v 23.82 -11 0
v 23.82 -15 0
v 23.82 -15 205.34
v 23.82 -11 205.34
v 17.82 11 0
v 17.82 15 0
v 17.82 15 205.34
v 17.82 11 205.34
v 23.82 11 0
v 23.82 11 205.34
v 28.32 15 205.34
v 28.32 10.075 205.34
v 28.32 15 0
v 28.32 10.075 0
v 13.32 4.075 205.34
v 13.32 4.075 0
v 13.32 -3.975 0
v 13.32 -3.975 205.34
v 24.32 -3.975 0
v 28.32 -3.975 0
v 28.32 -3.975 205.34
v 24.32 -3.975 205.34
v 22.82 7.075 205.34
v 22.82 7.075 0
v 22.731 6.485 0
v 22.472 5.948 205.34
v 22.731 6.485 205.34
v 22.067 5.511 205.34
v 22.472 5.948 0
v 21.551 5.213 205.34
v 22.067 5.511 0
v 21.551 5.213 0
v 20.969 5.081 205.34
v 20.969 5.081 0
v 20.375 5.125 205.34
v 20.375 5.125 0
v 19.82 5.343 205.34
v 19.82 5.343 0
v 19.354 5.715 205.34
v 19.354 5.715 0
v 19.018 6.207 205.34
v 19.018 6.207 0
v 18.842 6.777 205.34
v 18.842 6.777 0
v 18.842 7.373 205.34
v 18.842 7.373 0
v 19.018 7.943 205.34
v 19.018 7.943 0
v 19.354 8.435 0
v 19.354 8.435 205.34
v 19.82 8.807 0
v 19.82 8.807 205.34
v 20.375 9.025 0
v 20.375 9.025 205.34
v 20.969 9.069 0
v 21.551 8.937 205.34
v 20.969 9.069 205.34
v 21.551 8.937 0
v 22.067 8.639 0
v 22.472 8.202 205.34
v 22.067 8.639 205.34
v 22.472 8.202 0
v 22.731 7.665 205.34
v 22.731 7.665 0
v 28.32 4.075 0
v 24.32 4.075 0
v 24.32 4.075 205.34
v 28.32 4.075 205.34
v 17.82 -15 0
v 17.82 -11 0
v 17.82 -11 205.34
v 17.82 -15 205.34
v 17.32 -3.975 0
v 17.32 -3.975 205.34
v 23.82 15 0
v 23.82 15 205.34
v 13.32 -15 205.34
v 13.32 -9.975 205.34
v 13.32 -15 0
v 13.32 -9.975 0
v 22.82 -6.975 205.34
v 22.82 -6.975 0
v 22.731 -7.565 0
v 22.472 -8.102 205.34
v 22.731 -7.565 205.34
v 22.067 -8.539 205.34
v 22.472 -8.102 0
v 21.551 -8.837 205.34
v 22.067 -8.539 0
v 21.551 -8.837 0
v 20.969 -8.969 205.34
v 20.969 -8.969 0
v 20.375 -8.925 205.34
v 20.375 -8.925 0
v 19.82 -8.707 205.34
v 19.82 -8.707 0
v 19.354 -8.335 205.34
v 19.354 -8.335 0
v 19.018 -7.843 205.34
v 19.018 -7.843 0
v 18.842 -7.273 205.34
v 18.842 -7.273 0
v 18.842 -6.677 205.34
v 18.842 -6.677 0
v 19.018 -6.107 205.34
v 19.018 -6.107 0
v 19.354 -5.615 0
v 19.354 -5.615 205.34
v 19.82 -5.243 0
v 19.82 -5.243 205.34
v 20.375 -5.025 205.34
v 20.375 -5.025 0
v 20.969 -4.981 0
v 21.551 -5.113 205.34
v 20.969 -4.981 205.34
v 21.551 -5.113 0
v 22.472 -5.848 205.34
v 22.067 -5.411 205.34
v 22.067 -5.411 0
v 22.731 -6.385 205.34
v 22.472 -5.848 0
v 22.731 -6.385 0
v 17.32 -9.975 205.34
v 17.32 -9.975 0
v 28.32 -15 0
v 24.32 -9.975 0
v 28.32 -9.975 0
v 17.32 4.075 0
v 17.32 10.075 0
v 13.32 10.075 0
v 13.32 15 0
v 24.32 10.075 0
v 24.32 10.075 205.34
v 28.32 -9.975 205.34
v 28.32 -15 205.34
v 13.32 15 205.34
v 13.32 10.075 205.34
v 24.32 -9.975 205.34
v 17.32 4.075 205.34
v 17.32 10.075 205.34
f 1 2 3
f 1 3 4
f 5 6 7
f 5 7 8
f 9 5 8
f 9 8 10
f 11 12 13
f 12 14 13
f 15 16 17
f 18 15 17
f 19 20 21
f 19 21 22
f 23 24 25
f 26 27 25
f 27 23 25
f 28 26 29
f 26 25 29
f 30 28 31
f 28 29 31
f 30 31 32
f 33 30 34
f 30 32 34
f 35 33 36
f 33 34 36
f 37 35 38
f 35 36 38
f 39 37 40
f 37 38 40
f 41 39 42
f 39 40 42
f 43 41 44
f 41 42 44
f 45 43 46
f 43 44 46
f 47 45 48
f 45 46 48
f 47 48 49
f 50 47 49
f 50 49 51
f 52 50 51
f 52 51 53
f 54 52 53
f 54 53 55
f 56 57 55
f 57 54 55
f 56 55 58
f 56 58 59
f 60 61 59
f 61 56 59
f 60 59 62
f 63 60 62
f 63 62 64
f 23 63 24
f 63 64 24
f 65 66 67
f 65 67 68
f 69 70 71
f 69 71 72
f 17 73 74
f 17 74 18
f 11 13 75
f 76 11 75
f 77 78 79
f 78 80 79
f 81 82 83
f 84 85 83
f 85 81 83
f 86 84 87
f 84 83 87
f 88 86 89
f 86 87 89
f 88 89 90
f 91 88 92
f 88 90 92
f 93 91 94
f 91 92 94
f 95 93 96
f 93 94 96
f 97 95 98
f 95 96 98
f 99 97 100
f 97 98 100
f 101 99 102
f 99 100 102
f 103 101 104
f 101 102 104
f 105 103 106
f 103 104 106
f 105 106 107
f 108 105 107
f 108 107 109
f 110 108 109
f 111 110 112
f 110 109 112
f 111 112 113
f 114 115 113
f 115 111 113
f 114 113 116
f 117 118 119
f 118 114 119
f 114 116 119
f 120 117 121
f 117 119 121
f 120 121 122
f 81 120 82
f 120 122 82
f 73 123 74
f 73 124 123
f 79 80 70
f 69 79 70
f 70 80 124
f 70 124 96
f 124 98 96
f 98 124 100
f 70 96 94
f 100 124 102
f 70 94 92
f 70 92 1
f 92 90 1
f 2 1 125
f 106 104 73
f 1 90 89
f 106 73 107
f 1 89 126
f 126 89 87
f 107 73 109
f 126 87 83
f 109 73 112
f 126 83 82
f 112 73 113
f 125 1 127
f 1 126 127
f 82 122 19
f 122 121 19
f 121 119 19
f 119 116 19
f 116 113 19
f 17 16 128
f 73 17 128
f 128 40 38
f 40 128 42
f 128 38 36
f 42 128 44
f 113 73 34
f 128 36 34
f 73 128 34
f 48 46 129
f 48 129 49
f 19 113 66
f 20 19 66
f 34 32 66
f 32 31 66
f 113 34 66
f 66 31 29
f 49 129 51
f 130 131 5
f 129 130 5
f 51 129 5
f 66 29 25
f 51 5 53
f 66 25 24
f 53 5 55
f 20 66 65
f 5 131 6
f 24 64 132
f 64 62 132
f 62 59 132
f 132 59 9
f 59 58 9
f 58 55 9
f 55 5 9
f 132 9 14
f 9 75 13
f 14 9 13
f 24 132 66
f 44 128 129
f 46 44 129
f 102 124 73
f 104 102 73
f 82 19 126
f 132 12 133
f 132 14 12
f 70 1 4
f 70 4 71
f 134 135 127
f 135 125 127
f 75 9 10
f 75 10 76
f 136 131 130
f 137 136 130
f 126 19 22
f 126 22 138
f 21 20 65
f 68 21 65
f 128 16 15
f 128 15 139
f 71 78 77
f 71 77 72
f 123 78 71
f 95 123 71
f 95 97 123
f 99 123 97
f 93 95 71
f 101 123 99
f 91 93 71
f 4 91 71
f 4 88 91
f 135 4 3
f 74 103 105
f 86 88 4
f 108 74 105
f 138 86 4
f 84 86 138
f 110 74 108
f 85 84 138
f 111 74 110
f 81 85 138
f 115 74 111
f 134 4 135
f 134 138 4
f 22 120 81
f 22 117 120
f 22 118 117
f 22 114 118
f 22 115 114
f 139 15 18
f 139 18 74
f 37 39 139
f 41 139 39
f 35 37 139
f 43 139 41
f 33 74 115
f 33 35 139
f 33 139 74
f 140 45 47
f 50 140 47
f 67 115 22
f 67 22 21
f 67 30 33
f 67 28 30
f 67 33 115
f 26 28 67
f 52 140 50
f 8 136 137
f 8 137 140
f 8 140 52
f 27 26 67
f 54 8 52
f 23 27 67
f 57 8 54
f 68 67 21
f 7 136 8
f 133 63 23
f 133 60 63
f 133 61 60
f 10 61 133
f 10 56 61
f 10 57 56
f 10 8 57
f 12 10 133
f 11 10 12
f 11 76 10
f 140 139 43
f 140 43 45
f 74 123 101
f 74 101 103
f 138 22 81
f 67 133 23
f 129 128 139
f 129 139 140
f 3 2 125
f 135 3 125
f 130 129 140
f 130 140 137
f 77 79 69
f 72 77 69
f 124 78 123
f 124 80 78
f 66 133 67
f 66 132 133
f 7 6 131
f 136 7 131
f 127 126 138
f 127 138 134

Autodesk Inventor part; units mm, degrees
ref_plane "YZ Plane" through (0, 0, 0) normal (1, 0, 0) x (0, 1, 0)
ref_plane "XZ Plane" through (0, 0, 0) normal (0, 1, 0) x (-1, 0, 0)
ref_plane "Work Plane1" through (0, 0, 0) normal (0, 0, 1) x (1, 0, 0)
sketch "Sketch1" plane through (0, 0, 0) normal (0, 0, 1) x (1, 0, 0)
  circle A0 centre (-23.32, -39.075) radius 2.355 projected
  circle A1 centre (-23.32, 39.075) radius 2.355 projected
  circle A2 centre (20.82, -6.975) radius 2 projected
  circle A3 centre (20.82, 7.075) radius 2 projected
  line L0 (32.82, 48.575) -> (-32.82, 48.575) projected
  arc A4 (-32.82, 48.575) -> (-34.82, 46.575) centre (-32.82, 46.575) ccw projected
  line L1 (-34.82, 46.575) -> (-34.82, -46.575) projected
  arc A5 (-34.82, -46.575) -> (-32.82, -48.575) centre (-32.82, -46.575) ccw projected
  line L2 (-32.82, -48.575) -> (32.82, -48.575) projected
  arc A6 (32.82, -48.575) -> (34.82, -46.575) centre (32.82, -46.575) ccw projected
  line L3 (34.82, -46.575) -> (34.82, 46.575) projected
  arc A7 (34.82, 46.575) -> (32.82, 48.575) centre (32.82, 46.575) ccw projected
  line L4 (13.32, -15) -> (28.32, 15) construction
  line L5 (28.32, -15) -> (13.32, 15) construction
  line L6 (32.32, 10.075) -> (24.32, 10.075)
  line L7 (24.32, 10.075) -> (24.32, 4.075)
  line L8 (24.32, 4.075) -> (32.32, 4.075)
  line L9 (32.32, 4.075) -> (32.32, 10.075)
  line L10 (32.32, 10.075) -> (24.32, 4.075) construction
  line L11 (24.32, 10.075) -> (32.32, 4.075) construction
  line L12 (32.32, -3.975) -> (24.32, -3.975)
  line L13 (24.32, -3.975) -> (24.32, -9.975)
  line L14 (24.32, -9.975) -> (32.32, -9.975)
  line L15 (32.32, -9.975) -> (32.32, -3.975)
  line L16 (32.32, -3.975) -> (24.32, -9.975) construction
  line L17 (24.32, -3.975) -> (32.32, -9.975) construction
  line L18 (9.32, 4.075) -> (17.32, 4.075)
  line L19 (17.32, 4.075) -> (17.32, 10.075)
  line L20 (17.32, 10.075) -> (9.32, 10.075)
  line L21 (9.32, 10.075) -> (9.32, 4.075)
  line L22 (9.32, 4.075) -> (17.32, 10.075) construction
  line L23 (17.32, 4.075) -> (9.32, 10.075) construction
  line L24 (9.32, -9.975) -> (17.32, -9.975)
  line L25 (17.32, -9.975) -> (17.32, -3.975)
  line L26 (17.32, -3.975) -> (9.32, -3.975)
  line L27 (9.32, -3.975) -> (9.32, -9.975)
  line L28 (9.32, -9.975) -> (17.32, -3.975) construction
  line L29 (17.32, -9.975) -> (9.32, -3.975) construction
  line L30 (23.82, 19) -> (17.82, 19)
  line L31 (17.82, 19) -> (17.82, 11)
  line L32 (17.82, 11) -> (23.82, 11)
  line L33 (23.82, 11) -> (23.82, 19)
  line L34 (23.82, 19) -> (17.82, 11) construction
  line L35 (17.82, 19) -> (23.82, 11) construction
  line L36 (17.82, -19) -> (23.82, -19)
  line L37 (23.82, -19) -> (23.82, -11)
  line L38 (23.82, -11) -> (17.82, -11)
  line L39 (17.82, -11) -> (17.82, -19)
  line L40 (17.82, -19) -> (23.82, -11) construction
  line L41 (23.82, -19) -> (17.82, -11) construction
  line L42 (28.32, 15) -> (23.82, 15)
  line L43 (17.82, 15) -> (13.32, 15)
  line L44 (28.32, 10.075) -> (28.32, 15)
  line L45 (28.32, -15) -> (28.32, -9.975)
  line L46 (28.32, -3.975) -> (28.32, 4.075)
  line L47 (13.32, -15) -> (17.82, -15)
  line L48 (23.82, -15) -> (28.32, -15)
  line L49 (13.32, -9.975) -> (13.32, -15)
  line L50 (13.32, 15) -> (13.32, 10.075)
  line L51 (13.32, 4.075) -> (13.32, -3.975)
  point P0 (0, 0)
  point P1 (20.82, 0)
  dimension "d0" = 15
  dimension "d1" = 30
  dimension "d2" = 8
  dimension "d3" = 6
  dimension "d4" = 6
  dimension "d5" = 8
  dimension "d6" = 6
  dimension "d7" = 8
  dimension "d8" = 6
  dimension "d9" = 8
ref_plane "Work Plane2" through (-34.82, -48.575, 205.34) normal (0, 0, -1) x (0, 1, 0)
extrude "Extrusion1" add sketch "Sketch1" along normal up to surface (205.34 mm away) contours L6 L7 L8 L46 L12 L13 L14 L45 L48 L37 L38 L39 L47 L49 L24 L25 L26 L51 L18 L19 L20 L50 L43 L31 L32 L33 L42 L44
properties part number "Neje_Aluminium_Slide_X"
